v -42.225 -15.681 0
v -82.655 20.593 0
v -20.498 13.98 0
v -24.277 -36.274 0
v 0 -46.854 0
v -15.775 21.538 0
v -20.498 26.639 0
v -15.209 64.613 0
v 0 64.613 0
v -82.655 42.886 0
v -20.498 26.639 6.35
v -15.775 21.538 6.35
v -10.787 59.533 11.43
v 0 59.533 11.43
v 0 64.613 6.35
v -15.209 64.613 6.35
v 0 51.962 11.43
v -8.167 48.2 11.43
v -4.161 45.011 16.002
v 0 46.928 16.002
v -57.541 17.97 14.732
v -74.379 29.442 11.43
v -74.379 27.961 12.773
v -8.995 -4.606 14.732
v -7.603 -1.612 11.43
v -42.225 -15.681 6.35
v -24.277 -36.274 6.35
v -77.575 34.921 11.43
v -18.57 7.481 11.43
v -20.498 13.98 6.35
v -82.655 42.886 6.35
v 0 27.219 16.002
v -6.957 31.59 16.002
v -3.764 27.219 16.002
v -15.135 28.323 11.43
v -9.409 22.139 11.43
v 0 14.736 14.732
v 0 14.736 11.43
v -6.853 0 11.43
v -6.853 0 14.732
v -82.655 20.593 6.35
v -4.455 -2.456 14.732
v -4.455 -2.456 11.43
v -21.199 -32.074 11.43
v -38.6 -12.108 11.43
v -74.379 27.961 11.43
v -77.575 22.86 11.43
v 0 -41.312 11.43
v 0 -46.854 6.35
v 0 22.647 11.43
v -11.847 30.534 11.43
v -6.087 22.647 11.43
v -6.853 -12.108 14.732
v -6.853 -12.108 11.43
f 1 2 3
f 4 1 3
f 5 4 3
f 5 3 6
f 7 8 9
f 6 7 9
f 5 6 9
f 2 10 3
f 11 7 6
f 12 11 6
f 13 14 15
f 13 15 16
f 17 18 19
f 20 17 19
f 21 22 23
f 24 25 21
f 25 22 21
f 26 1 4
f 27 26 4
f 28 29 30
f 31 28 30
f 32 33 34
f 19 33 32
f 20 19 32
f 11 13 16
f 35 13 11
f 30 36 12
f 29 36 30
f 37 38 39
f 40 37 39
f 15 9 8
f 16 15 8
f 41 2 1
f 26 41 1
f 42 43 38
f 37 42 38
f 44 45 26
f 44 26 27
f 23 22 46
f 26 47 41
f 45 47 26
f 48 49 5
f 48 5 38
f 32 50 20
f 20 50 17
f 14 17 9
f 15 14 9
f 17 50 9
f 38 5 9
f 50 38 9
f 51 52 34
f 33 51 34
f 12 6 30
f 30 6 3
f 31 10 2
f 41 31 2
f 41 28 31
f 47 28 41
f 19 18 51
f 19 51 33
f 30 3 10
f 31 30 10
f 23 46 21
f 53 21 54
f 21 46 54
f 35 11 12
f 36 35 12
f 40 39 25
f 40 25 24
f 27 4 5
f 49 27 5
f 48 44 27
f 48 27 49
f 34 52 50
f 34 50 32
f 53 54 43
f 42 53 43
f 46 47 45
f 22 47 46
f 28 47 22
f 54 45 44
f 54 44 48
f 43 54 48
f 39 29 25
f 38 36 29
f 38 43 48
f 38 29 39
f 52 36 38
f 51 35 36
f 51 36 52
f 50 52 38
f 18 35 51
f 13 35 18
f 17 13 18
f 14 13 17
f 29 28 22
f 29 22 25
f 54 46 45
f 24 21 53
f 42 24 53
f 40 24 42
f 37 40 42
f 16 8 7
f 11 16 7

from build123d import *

# Parameters (mm, degrees)
F1_DEPTH     = 11.43
F2_SIZE      = 5.08
F4_DEPTH     = 4.572
F5_T4_DEPTH  = 35.6101050897
F5_T9_DEPTH  = 44.6545724626
F5_T14_DEPTH = 36.379020654
F5_T19_DEPTH = 32.4730482843
F7_DEPTH     = 3.302
F8_T4_DEPTH  = 87.5344337201


# Not quite as in the source:
# - a fillet or chamfer that OpenCascade refuses, or shapes differently, is made with other operations: its cross-section is extruded or revolved along the edge and cut away or added


with BuildPart() as f1:
    # F0 (on Top) → F1 (new body)
    with BuildSketch(Plane.XY):
        Polygon((0, -46.853557229), (0, 64.6125674248), (-15.2085125446, 64.6125674248), (-20.4984303564, 26.6385115683), (-15.7752875239, 21.5375181288), (-20.4984303564, 13.9804948121), (-82.6549530029, 42.8861156106), (-82.6549530029, 20.5928906798), (-42.2248728573, -15.6808290631), (-24.276940152, -36.2737216055), align=None)
    extrude(amount=F1_DEPTH)

    # F2
    f2_edges = [f1.edges().sort_by_distance(p)[0] for p in [
        (-51.576692, 28.433305, 11.43),
        (-82.654953, 31.739503, 11.43),
        (-62.439913, 2.456031, 11.43),
        (-18.136859, 17.759006, 11.43),
        (-18.136859, 24.088015, 11.43),
        (-17.853471, 45.625539, 11.43),
        (-7.604256, 64.612567, 11.43),
        (-33.250907, -25.977275, 11.43),
        (-12.13847, -41.563639, 11.43),
    ]]
    chamfer(f2_edges, length=F2_SIZE)

    # F3 (on face) → F4 (join)
    with BuildSketch(Plane.XY.offset(11.43)):
        Polygon((0, 22.1388745617), (0, 52.5213219225), (-8.6118569598, 48.5538840294), (-12.3903686181, 30.4170250893), (-6.3447491266, 22.1388745617), align=None)
    extrude(amount=F4_DEPTH)

    # F5: chamfer of 5.08 on 4 edges, made by hand


with BuildPart() as f5_tool2:
    # F5_s3 → F5_t4 (new body)
    with BuildSketch(Plane(origin=(31.8255199814, 14.6618522037, 0), x_dir=(0, 0, 1), z_dir=(-0.9082507089, -0.418426397, 0))):
        Polygon((10.922, 47.7025278707), (16.002, 42.6225278707), (16.002, 47.7025278707), align=None)
    extrude(amount=F5_T4_DEPTH)

    split(bisect_by=Plane.XY.offset(11.43), keep=Keep.TOP)


with BuildPart() as f1_1:
    add(f1.part)

    # F5_t1: cut F5_tool2
    add(f5_tool2.part, mode=Mode.SUBTRACT)


with BuildPart() as f5_tool7:
    # F5_s8 → F5_t9 (new body)
    with BuildSketch(Plane(origin=(12.0008759003, 57.6042137868, 0), x_dir=(0, 0, 1), z_dir=(-0.203954222, -0.9789804264, 0))):
        Polygon((10.922, 18.3336090407), (16.002, 13.2536090407), (16.002, 18.3336090407), align=None)
    extrude(amount=F5_T9_DEPTH)

    split(bisect_by=Plane.XY.offset(11.43), keep=Keep.TOP)


with BuildPart() as f1_2:
    add(f1_1.part)

    # F5_t6: cut F5_tool7
    add(f5_tool7.part, mode=Mode.SUBTRACT)


with BuildPart() as f5_tool12:
    # F5_s13 → F5_t14 (new body)
    with BuildSketch(Plane(origin=(-26.5018256682, 36.2884403239, 0), x_dir=(0, 0, 1), z_dir=(0.5897750216, -0.8075675971, 0))):
        Polygon((10.922, -7.9331414154), (16.002, -13.0131414154), (16.002, -7.9331414154), align=None)
    extrude(amount=F5_T14_DEPTH)

    split(bisect_by=Plane.XY.offset(11.43), keep=Keep.TOP)


with BuildPart() as f1_3:
    add(f1_2.part)

    # F5_t11: cut F5_tool12
    add(f5_tool12.part, mode=Mode.SUBTRACT)


with BuildPart() as f5_tool17:
    # F5_s18 → F5_t19 (new body)
    with BuildSketch(Plane.YZ.offset(-19.4088987055)):
        Polygon((22.1388745617, 10.922), (27.2188745617, 16.002), (22.1388745617, 16.002), align=None)
    extrude(amount=F5_T19_DEPTH)

    split(bisect_by=Plane.XY.offset(11.43), keep=Keep.TOP)


with BuildPart() as f1_4:
    add(f1_3.part)

    # F5_t16: cut F5_tool17
    add(f5_tool17.part, mode=Mode.SUBTRACT)

    # F6 (on face) → F7 (join)
    with BuildSketch(Plane.XY.offset(11.43)):
        Polygon((-4.4554928318, -2.4560331367), (0, 14.7361988202), (-6.8530052353, 0), (-74.3786075584, 31.4024879744), (-74.3786075584, 27.9609914869), (-6.8530052353, -12.1079402775), align=None)
    extrude(amount=F7_DEPTH)

    # F8: chamfer of 5.08 on 1 edges, made by hand


with BuildPart() as f8_tool2:
    # F8_s3 → F8_t4 (new body)
    with BuildSketch(Plane(origin=(-5.6344557861, 2.6202791827, 0), x_dir=(0, 0, 1), z_dir=(-0.9067455979, 0.4216781007, 0))):
        Polygon((9.652, -2.8897622316), (14.732, -7.9697622316), (14.732, -2.8897622316), align=None)
    extrude(amount=F8_T4_DEPTH)

    split(bisect_by=Plane.XY.offset(11.43), keep=Keep.TOP)


with BuildPart() as f1_5:
    add(f1_4.part)

    # F8_t1: cut F8_tool2
    add(f8_tool2.part, mode=Mode.SUBTRACT)


solid = f1_5.part
